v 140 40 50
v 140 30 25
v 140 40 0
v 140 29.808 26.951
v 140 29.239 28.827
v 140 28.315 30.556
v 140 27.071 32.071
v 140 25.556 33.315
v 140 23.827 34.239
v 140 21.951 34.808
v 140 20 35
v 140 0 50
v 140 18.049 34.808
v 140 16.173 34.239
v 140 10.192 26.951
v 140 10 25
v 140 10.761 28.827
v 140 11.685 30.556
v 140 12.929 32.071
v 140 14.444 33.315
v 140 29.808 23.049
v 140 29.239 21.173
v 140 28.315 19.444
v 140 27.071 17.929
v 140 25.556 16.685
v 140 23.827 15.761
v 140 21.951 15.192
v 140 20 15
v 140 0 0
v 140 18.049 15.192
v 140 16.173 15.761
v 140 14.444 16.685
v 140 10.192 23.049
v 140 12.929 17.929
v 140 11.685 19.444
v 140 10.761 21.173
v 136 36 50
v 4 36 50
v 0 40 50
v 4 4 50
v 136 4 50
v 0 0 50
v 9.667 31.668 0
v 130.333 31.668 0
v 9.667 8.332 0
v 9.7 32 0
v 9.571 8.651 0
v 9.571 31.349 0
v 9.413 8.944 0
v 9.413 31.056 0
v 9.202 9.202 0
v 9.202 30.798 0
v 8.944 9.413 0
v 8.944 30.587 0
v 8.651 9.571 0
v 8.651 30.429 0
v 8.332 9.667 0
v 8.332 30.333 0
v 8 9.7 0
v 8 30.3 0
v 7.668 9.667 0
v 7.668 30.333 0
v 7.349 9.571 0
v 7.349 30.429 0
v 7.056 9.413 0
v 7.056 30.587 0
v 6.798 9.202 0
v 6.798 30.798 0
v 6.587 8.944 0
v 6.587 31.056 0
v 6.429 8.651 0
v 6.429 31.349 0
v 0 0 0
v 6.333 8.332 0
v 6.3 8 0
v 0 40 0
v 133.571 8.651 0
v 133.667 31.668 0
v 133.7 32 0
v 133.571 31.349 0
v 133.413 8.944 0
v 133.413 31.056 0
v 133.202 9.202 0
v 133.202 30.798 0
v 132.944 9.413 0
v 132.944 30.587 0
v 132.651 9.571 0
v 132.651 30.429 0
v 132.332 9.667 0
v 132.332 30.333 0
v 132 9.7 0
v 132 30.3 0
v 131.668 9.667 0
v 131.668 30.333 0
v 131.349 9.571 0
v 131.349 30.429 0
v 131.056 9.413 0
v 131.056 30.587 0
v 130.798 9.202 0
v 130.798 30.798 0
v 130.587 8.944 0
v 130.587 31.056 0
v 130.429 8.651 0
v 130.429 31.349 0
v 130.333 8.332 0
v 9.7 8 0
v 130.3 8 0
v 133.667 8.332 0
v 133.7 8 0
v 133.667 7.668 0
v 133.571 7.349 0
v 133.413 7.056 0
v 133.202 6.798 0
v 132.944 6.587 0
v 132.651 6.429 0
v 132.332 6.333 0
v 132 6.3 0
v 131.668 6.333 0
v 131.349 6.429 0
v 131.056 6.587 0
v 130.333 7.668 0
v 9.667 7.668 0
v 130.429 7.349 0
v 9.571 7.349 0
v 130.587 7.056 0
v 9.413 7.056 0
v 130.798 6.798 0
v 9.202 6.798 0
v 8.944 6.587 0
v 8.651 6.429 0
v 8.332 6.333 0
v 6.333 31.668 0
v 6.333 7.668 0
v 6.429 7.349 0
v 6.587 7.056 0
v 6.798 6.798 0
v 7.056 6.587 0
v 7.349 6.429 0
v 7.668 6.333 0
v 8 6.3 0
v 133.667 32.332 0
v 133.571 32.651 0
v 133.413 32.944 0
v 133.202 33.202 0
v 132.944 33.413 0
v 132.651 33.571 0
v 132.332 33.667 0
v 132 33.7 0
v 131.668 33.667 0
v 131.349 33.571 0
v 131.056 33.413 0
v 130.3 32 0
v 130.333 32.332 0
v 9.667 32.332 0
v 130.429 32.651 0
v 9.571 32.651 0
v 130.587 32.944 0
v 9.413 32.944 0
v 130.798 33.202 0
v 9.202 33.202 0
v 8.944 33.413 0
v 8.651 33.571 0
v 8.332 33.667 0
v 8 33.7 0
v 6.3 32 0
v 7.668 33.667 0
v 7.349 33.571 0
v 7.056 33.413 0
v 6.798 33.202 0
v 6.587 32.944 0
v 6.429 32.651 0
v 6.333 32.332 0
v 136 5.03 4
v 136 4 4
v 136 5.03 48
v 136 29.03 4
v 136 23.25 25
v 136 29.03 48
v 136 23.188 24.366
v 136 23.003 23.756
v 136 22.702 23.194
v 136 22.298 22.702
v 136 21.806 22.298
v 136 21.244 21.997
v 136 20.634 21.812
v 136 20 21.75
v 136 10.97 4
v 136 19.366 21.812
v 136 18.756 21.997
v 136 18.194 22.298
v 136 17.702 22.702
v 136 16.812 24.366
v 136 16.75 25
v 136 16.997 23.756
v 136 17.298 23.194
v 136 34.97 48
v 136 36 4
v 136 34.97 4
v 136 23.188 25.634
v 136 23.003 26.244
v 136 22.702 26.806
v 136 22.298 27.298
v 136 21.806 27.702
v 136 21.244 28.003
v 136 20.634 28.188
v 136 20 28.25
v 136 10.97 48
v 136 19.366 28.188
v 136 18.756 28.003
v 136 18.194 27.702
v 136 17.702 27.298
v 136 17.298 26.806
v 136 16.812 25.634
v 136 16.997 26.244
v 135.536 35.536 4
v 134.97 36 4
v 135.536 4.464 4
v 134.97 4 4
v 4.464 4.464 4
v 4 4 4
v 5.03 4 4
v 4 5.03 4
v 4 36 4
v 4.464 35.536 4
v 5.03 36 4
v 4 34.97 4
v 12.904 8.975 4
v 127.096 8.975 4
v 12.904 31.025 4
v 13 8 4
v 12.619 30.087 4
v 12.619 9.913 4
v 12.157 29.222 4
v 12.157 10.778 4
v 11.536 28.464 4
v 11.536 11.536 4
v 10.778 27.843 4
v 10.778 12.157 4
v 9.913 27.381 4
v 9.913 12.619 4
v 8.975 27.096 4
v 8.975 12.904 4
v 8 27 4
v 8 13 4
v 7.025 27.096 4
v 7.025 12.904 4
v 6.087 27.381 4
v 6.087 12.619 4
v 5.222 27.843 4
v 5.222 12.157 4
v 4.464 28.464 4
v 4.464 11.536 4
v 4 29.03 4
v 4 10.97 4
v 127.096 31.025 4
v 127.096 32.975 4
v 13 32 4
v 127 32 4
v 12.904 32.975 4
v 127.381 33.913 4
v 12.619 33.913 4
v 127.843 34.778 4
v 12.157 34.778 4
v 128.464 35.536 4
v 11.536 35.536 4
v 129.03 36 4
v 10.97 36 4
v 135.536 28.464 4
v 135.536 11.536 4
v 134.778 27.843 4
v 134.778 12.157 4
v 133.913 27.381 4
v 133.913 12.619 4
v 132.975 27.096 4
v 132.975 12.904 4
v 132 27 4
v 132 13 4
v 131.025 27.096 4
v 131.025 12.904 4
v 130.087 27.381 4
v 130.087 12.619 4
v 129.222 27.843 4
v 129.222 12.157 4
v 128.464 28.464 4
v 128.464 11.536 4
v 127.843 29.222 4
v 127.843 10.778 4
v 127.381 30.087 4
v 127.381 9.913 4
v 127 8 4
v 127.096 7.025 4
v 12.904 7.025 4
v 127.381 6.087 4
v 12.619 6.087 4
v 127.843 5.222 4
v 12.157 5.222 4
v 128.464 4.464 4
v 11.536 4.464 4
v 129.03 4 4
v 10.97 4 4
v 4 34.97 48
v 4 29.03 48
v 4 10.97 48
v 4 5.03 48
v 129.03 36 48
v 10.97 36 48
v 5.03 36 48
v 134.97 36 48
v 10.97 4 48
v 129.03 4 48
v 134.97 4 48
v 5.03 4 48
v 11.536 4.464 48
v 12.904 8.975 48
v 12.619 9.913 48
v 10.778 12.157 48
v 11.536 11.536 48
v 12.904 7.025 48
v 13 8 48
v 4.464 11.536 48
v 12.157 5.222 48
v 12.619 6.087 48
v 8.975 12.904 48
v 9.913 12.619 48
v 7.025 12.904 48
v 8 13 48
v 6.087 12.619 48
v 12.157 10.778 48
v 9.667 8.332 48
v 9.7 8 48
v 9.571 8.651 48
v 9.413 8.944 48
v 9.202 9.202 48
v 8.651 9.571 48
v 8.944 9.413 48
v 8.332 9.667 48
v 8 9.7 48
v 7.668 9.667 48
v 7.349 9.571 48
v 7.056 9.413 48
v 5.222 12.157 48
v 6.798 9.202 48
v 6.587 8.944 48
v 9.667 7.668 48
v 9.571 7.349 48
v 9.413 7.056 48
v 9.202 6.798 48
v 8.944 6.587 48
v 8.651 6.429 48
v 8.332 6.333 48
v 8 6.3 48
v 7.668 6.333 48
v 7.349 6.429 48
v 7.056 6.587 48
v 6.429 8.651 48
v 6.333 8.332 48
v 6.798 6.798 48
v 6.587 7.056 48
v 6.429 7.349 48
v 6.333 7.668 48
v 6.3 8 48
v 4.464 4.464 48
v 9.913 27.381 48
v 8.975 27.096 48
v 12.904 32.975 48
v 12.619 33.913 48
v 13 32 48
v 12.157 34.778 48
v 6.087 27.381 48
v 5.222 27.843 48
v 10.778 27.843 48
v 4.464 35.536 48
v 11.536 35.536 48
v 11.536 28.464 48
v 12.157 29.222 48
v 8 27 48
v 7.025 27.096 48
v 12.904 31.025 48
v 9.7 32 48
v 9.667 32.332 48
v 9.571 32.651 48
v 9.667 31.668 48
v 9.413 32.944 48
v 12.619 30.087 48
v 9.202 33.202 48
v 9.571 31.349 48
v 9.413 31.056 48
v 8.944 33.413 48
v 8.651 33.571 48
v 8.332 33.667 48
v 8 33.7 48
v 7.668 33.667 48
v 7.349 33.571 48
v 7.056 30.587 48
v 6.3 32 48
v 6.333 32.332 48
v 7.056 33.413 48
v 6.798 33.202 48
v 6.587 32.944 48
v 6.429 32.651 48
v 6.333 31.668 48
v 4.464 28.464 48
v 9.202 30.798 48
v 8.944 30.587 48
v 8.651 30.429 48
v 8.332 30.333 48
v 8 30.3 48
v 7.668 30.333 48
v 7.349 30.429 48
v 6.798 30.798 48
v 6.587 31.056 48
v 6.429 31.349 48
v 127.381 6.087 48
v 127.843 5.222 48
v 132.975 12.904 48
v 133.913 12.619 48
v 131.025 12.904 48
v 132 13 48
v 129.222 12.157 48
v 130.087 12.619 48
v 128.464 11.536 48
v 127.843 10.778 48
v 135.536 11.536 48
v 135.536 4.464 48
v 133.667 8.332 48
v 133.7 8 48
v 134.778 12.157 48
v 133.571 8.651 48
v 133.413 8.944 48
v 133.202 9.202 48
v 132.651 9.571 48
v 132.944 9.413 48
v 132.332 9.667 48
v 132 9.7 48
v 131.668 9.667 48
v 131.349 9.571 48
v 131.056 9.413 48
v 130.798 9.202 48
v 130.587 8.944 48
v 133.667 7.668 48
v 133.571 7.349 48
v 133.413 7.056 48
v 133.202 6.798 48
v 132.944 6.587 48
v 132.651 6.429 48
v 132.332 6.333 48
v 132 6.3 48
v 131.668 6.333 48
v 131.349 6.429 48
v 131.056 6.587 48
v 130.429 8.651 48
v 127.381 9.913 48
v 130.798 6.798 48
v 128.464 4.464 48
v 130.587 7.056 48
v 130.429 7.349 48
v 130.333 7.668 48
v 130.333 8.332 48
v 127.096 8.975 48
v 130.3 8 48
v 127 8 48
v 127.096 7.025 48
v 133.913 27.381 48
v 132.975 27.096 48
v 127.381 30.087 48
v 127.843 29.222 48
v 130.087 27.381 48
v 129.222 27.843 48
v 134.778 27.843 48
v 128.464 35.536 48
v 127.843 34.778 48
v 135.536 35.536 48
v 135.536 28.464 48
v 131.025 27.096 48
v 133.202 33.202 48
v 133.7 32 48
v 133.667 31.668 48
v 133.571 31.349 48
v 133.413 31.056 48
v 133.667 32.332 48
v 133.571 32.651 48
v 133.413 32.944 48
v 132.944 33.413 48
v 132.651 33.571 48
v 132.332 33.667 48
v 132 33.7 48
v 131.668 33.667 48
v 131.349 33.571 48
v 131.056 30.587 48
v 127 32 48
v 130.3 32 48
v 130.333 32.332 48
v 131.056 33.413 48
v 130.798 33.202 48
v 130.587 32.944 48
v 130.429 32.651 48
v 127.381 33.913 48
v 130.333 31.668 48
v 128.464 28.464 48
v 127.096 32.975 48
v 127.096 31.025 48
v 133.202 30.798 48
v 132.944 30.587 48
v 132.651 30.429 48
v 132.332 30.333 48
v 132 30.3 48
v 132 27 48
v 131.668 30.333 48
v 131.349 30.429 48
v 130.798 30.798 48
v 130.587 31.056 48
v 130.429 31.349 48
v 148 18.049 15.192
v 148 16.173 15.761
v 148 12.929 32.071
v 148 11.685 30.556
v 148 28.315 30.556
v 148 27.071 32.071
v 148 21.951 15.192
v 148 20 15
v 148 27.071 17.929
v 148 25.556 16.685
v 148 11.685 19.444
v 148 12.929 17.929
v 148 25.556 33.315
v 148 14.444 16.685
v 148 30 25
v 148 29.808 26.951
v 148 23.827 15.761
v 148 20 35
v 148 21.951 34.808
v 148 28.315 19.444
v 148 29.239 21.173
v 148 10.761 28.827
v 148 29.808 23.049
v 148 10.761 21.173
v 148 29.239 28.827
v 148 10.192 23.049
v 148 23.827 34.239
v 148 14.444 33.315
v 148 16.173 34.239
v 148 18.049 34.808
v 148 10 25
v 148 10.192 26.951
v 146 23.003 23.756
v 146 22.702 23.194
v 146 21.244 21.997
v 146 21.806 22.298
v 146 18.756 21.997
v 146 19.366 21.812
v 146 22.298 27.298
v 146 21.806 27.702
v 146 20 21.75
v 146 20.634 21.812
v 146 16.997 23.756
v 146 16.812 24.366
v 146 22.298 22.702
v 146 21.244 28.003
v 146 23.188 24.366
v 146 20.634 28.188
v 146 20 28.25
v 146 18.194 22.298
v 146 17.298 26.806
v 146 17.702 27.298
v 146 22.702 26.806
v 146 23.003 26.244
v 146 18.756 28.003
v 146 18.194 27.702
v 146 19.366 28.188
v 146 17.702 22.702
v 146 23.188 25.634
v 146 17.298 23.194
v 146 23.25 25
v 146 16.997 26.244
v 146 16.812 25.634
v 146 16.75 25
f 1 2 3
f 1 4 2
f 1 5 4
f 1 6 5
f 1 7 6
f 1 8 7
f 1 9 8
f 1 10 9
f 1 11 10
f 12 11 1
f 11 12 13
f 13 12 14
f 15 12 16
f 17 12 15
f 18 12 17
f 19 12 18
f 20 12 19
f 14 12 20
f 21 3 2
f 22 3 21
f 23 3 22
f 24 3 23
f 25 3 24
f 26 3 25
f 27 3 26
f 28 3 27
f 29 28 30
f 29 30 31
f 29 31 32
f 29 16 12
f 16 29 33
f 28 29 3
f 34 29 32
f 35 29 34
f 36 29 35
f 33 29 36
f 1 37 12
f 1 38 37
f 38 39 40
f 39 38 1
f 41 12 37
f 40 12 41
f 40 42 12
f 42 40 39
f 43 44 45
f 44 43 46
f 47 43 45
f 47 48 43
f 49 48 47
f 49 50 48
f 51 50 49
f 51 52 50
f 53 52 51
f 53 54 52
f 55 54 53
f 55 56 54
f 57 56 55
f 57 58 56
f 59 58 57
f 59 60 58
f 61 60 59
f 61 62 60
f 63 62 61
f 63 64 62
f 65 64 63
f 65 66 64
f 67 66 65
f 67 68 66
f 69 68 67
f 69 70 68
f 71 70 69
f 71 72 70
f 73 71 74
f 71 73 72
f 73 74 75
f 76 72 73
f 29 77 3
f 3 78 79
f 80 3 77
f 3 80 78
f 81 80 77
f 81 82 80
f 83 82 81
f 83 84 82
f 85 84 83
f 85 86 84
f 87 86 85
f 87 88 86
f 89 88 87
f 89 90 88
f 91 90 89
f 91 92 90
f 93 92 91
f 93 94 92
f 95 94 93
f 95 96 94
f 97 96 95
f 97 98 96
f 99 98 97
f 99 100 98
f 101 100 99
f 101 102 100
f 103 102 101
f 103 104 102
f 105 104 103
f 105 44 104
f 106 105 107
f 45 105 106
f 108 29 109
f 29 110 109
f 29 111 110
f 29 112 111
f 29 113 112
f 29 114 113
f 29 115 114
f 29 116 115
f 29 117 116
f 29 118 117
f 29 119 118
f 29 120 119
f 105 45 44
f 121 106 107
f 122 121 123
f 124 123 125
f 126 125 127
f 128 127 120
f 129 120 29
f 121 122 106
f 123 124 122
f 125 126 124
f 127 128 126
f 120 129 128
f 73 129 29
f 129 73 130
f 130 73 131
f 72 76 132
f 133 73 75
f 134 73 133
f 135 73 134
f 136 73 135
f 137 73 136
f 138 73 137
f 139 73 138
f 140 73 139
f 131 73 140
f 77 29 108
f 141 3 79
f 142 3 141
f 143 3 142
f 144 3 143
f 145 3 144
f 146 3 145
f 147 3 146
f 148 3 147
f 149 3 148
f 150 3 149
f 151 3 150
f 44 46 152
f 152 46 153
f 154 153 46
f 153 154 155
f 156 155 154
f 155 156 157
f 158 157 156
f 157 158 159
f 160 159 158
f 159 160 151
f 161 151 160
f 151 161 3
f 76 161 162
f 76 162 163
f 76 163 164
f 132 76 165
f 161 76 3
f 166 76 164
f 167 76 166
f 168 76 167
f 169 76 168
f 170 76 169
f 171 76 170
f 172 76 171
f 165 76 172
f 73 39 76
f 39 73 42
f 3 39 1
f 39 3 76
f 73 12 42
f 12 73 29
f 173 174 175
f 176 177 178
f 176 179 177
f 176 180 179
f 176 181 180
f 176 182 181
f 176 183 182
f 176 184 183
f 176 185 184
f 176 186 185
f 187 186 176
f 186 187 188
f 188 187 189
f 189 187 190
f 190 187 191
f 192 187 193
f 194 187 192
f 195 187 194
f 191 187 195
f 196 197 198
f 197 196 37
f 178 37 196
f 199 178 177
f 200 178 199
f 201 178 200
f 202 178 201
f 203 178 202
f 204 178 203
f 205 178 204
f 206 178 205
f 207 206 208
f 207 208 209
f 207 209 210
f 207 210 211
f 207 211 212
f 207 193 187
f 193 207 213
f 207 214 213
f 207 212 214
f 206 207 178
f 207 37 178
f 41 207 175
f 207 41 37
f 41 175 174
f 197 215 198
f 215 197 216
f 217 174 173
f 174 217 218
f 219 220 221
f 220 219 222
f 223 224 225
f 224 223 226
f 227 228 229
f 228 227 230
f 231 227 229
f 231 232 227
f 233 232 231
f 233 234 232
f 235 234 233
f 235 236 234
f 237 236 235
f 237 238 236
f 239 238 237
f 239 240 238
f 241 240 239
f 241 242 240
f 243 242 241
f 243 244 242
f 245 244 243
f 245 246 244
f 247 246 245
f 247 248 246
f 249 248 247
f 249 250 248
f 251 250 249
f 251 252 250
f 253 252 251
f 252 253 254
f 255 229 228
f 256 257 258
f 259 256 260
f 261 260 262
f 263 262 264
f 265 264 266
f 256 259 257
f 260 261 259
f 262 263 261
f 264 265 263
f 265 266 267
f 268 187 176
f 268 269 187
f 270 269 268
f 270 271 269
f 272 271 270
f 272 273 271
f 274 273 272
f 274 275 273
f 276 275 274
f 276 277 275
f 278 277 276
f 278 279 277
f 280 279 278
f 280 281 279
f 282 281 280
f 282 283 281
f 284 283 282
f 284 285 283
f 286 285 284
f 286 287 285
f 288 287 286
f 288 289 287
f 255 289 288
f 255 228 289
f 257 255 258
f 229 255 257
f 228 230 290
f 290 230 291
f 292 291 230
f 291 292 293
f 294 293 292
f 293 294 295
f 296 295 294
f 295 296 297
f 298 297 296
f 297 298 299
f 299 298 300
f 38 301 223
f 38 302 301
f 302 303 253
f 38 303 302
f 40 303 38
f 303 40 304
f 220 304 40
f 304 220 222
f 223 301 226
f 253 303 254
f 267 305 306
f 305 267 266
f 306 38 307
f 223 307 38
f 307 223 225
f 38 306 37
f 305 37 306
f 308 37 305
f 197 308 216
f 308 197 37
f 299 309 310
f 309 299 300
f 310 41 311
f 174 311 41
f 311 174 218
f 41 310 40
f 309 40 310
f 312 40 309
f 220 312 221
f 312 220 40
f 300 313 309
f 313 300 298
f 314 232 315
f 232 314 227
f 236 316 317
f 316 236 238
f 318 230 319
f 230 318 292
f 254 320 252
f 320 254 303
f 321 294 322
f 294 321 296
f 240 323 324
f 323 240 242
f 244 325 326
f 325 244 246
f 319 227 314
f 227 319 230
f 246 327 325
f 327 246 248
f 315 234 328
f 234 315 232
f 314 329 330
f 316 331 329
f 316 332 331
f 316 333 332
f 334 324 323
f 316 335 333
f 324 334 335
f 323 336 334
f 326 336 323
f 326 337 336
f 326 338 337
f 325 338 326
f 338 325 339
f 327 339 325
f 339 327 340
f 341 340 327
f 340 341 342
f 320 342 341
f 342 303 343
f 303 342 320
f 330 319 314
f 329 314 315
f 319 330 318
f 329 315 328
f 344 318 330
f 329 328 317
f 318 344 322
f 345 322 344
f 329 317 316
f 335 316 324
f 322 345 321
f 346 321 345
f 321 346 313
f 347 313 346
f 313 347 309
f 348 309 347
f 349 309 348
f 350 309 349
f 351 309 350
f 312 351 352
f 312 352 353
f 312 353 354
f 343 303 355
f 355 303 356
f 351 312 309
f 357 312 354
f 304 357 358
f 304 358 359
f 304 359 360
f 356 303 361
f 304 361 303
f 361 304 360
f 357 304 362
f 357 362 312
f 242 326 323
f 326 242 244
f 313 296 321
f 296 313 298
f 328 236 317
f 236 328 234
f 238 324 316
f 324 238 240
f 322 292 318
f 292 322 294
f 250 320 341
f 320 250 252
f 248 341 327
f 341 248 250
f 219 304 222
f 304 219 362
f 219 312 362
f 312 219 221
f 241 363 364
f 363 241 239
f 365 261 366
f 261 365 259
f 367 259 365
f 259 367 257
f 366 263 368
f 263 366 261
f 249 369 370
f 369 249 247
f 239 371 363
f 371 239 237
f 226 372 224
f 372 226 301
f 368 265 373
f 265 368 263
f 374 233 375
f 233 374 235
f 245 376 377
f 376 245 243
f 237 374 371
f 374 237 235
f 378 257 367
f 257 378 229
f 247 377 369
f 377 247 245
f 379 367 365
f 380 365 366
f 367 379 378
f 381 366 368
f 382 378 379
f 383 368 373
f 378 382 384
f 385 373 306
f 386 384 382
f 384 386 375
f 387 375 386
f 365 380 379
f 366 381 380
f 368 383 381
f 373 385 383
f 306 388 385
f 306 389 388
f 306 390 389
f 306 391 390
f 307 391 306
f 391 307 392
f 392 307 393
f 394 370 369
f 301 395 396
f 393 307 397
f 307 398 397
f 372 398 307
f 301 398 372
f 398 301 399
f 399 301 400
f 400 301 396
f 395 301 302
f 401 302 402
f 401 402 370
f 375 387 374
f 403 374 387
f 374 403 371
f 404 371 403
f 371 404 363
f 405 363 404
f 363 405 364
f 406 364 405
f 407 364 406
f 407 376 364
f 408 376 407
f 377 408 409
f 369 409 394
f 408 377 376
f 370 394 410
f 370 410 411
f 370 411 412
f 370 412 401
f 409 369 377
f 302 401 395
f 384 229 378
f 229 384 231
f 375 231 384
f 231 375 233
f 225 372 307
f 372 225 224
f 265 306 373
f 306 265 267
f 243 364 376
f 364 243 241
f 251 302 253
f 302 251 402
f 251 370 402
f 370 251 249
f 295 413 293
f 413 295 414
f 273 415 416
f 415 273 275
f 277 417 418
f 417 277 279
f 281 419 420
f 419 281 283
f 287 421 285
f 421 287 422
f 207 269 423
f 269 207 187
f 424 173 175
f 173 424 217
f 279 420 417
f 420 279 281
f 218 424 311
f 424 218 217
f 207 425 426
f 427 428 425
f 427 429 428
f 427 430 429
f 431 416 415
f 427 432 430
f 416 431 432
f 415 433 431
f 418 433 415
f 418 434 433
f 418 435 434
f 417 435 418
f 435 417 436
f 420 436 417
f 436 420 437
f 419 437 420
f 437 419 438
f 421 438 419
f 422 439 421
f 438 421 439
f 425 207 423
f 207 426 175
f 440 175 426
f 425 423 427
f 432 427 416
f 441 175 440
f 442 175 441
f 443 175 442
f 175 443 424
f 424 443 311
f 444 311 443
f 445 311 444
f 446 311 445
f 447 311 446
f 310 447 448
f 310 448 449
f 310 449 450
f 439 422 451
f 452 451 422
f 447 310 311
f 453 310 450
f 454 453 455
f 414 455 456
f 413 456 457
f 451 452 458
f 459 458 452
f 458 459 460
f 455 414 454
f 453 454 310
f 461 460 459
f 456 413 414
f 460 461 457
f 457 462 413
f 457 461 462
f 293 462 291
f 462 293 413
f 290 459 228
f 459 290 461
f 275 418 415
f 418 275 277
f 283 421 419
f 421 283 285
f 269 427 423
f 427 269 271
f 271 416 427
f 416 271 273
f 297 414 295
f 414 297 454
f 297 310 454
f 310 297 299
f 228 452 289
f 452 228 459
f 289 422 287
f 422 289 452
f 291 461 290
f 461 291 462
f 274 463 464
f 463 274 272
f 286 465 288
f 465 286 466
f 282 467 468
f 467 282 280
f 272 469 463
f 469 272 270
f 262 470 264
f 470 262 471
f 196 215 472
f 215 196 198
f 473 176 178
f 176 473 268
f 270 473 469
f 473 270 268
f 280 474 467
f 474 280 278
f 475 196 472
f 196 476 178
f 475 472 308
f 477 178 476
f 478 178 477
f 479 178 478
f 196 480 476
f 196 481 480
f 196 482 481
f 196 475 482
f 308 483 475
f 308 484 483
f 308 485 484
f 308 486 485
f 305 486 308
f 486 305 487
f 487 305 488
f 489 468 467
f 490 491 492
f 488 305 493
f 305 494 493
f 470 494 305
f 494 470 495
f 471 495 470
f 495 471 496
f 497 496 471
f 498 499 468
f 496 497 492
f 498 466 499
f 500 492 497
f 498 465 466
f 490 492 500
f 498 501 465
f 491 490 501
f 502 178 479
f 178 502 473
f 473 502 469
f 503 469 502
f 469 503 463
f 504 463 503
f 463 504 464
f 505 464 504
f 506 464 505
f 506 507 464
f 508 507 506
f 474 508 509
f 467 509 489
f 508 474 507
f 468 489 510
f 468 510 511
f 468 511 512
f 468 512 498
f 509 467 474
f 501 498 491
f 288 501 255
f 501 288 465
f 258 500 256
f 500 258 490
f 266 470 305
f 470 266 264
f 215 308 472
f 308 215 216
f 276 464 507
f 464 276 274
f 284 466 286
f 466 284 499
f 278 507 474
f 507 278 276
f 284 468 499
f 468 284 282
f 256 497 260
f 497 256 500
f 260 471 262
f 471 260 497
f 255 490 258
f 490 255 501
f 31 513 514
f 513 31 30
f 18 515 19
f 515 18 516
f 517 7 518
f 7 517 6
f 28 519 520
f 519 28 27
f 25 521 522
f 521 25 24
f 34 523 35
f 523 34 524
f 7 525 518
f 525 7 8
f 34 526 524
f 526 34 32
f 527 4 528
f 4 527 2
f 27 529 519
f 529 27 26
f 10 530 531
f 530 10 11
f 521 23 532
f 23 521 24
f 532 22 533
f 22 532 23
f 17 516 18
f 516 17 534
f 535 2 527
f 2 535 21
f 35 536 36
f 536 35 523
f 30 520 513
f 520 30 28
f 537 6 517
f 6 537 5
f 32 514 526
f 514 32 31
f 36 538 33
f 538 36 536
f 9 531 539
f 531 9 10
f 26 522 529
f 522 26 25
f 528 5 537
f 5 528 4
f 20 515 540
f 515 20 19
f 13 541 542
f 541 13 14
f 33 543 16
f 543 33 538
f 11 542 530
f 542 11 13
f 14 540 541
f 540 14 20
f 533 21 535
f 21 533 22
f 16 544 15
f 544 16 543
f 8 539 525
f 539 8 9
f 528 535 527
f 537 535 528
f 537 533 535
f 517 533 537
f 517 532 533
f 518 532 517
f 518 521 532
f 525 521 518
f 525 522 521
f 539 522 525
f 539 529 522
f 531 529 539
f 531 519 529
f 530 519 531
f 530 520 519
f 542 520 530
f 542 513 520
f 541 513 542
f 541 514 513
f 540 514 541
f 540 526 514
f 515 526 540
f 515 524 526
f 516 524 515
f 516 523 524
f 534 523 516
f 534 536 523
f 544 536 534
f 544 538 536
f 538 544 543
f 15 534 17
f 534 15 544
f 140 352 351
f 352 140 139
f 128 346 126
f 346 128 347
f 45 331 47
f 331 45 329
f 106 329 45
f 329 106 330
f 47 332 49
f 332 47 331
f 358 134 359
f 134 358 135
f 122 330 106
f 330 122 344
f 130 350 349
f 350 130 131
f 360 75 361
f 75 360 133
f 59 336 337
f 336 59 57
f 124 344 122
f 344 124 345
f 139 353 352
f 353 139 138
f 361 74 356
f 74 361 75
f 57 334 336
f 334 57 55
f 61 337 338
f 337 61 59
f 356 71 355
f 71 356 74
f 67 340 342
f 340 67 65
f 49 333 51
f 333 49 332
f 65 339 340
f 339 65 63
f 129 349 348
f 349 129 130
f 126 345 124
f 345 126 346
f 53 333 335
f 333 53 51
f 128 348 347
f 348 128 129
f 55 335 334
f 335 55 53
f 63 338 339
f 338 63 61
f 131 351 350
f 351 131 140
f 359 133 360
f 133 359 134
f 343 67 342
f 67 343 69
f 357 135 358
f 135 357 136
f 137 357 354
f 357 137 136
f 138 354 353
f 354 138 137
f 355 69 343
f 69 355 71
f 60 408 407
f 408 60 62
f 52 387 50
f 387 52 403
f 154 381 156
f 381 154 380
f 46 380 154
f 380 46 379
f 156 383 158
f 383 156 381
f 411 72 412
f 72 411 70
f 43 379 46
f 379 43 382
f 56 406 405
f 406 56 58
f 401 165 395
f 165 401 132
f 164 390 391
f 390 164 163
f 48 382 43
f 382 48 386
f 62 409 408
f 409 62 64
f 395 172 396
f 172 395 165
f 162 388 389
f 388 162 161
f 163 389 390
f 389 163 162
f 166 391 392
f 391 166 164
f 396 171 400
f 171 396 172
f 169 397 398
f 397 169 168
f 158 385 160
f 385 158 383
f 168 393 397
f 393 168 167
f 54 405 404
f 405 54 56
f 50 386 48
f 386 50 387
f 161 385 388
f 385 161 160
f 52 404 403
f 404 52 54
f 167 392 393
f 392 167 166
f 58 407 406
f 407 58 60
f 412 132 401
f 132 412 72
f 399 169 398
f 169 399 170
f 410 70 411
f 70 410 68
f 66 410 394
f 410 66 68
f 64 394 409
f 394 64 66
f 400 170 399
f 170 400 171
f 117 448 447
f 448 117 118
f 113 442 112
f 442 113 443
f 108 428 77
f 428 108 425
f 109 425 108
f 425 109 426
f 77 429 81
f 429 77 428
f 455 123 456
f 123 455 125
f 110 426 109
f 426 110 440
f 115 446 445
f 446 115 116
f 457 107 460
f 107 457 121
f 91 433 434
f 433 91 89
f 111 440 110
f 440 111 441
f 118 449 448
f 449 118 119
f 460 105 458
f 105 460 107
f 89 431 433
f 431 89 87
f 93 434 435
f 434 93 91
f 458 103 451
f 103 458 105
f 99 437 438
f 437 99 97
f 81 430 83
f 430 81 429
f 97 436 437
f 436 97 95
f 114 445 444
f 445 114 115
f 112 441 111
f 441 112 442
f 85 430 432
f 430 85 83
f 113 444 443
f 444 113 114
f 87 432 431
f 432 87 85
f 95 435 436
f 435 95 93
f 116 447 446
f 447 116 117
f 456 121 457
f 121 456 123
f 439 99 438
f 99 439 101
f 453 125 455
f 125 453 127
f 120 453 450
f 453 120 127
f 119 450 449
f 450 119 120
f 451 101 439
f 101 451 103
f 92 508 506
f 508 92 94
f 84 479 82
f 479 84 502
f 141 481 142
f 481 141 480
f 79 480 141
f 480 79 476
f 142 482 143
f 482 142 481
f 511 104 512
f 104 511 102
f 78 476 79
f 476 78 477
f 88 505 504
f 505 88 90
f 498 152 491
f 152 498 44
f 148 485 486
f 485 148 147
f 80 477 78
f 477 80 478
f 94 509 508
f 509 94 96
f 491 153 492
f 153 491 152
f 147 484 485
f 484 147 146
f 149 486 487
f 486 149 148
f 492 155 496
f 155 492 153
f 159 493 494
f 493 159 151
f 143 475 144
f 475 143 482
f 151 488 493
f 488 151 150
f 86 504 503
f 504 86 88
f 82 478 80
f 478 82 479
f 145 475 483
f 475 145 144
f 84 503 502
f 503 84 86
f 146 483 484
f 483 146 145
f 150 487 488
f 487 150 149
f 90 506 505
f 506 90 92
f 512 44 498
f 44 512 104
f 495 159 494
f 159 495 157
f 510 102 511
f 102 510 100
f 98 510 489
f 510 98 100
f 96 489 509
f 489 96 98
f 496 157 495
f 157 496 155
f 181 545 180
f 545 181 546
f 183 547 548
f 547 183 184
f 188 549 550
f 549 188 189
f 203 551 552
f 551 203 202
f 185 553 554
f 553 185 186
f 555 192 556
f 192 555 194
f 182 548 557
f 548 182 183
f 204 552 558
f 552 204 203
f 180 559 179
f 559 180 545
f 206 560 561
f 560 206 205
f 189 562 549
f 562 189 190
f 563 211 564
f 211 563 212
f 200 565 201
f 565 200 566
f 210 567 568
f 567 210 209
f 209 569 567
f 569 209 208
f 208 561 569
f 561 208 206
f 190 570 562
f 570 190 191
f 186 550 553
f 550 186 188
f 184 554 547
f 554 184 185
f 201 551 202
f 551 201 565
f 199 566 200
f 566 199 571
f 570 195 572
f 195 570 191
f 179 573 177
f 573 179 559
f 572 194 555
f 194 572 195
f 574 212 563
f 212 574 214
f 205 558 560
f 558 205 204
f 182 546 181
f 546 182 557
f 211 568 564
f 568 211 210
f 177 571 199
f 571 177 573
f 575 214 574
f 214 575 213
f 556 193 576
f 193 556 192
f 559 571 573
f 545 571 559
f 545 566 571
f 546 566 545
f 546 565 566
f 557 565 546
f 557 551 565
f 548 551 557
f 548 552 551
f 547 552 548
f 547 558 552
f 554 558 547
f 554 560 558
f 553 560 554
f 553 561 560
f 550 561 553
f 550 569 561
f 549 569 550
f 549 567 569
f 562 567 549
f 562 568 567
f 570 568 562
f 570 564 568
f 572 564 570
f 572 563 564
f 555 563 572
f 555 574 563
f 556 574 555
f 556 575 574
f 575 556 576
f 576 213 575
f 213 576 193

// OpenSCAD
$fn = 32;

// ----------------------------------------------------------------------
// Enclosure body: 140 x 40 x 50 mm, wall 4 mm
// ----------------------------------------------------------------------

// --- parameters (mm) ---
length = 140;             // outside length, X
width = 40;               // outside width, Y
height = 50;              // outside height, Z
wall = 4;                 // side wall thickness
floor_t = 4;              // floor thickness
boss_d = 10;              // corner boss diameter
boss_h = 44;              // corner boss height above the floor
boss_hole_d = 3.4;        // lid screw clearance in the boss
boss_lip = 8;             // boss centre inset from the corner
nipple_d = 20;            // cable gland boss diameter
nipple_h = 8;             // cable gland boss height
nipple_bore = 6.5;        // cable gland bore

module shell() {
  difference() {
    cube([length, width, height]);
    /* hollow, open at the top */
    translate([wall, wall, floor_t])
      cube([length - 2 * wall, width - 2 * wall, height]);
  }
}

module bosses() {
  /* corner bosses, sunk 1 mm into the floor */
  for (sx = [0, 1]) for (sy = [0, 1])
    translate([sx * (length - 2 * boss_lip) + boss_lip, sy * (width - 2 * boss_lip) + boss_lip, floor_t - 1])
      cylinder(h = boss_h + 1, d = boss_d);
}

module gland() {
  /* boss on the short wall, sunk 1 mm into it */
  translate([length - 1, width / 2, height * 0.5]) rotate([0, 90, 0])
    cylinder(h = nipple_h + 1, d = nipple_d);
}

difference() {
  union() {
    shell();
    bosses();
    gland();
  }
  /* boss screw holes */
  for (sx = [0, 1]) for (sy = [0, 1])
    translate([sx * (length - 2 * boss_lip) + boss_lip, sy * (width - 2 * boss_lip) + boss_lip, -1]) cylinder(h = floor_t + boss_h + 2, d = boss_hole_d);
  translate([length, width / 2, height * 0.5]) rotate([0, 90, 0]) translate([0, 0, -nipple_h - 2]) cylinder(h = nipple_h + wall + 4, d = nipple_bore);
}
